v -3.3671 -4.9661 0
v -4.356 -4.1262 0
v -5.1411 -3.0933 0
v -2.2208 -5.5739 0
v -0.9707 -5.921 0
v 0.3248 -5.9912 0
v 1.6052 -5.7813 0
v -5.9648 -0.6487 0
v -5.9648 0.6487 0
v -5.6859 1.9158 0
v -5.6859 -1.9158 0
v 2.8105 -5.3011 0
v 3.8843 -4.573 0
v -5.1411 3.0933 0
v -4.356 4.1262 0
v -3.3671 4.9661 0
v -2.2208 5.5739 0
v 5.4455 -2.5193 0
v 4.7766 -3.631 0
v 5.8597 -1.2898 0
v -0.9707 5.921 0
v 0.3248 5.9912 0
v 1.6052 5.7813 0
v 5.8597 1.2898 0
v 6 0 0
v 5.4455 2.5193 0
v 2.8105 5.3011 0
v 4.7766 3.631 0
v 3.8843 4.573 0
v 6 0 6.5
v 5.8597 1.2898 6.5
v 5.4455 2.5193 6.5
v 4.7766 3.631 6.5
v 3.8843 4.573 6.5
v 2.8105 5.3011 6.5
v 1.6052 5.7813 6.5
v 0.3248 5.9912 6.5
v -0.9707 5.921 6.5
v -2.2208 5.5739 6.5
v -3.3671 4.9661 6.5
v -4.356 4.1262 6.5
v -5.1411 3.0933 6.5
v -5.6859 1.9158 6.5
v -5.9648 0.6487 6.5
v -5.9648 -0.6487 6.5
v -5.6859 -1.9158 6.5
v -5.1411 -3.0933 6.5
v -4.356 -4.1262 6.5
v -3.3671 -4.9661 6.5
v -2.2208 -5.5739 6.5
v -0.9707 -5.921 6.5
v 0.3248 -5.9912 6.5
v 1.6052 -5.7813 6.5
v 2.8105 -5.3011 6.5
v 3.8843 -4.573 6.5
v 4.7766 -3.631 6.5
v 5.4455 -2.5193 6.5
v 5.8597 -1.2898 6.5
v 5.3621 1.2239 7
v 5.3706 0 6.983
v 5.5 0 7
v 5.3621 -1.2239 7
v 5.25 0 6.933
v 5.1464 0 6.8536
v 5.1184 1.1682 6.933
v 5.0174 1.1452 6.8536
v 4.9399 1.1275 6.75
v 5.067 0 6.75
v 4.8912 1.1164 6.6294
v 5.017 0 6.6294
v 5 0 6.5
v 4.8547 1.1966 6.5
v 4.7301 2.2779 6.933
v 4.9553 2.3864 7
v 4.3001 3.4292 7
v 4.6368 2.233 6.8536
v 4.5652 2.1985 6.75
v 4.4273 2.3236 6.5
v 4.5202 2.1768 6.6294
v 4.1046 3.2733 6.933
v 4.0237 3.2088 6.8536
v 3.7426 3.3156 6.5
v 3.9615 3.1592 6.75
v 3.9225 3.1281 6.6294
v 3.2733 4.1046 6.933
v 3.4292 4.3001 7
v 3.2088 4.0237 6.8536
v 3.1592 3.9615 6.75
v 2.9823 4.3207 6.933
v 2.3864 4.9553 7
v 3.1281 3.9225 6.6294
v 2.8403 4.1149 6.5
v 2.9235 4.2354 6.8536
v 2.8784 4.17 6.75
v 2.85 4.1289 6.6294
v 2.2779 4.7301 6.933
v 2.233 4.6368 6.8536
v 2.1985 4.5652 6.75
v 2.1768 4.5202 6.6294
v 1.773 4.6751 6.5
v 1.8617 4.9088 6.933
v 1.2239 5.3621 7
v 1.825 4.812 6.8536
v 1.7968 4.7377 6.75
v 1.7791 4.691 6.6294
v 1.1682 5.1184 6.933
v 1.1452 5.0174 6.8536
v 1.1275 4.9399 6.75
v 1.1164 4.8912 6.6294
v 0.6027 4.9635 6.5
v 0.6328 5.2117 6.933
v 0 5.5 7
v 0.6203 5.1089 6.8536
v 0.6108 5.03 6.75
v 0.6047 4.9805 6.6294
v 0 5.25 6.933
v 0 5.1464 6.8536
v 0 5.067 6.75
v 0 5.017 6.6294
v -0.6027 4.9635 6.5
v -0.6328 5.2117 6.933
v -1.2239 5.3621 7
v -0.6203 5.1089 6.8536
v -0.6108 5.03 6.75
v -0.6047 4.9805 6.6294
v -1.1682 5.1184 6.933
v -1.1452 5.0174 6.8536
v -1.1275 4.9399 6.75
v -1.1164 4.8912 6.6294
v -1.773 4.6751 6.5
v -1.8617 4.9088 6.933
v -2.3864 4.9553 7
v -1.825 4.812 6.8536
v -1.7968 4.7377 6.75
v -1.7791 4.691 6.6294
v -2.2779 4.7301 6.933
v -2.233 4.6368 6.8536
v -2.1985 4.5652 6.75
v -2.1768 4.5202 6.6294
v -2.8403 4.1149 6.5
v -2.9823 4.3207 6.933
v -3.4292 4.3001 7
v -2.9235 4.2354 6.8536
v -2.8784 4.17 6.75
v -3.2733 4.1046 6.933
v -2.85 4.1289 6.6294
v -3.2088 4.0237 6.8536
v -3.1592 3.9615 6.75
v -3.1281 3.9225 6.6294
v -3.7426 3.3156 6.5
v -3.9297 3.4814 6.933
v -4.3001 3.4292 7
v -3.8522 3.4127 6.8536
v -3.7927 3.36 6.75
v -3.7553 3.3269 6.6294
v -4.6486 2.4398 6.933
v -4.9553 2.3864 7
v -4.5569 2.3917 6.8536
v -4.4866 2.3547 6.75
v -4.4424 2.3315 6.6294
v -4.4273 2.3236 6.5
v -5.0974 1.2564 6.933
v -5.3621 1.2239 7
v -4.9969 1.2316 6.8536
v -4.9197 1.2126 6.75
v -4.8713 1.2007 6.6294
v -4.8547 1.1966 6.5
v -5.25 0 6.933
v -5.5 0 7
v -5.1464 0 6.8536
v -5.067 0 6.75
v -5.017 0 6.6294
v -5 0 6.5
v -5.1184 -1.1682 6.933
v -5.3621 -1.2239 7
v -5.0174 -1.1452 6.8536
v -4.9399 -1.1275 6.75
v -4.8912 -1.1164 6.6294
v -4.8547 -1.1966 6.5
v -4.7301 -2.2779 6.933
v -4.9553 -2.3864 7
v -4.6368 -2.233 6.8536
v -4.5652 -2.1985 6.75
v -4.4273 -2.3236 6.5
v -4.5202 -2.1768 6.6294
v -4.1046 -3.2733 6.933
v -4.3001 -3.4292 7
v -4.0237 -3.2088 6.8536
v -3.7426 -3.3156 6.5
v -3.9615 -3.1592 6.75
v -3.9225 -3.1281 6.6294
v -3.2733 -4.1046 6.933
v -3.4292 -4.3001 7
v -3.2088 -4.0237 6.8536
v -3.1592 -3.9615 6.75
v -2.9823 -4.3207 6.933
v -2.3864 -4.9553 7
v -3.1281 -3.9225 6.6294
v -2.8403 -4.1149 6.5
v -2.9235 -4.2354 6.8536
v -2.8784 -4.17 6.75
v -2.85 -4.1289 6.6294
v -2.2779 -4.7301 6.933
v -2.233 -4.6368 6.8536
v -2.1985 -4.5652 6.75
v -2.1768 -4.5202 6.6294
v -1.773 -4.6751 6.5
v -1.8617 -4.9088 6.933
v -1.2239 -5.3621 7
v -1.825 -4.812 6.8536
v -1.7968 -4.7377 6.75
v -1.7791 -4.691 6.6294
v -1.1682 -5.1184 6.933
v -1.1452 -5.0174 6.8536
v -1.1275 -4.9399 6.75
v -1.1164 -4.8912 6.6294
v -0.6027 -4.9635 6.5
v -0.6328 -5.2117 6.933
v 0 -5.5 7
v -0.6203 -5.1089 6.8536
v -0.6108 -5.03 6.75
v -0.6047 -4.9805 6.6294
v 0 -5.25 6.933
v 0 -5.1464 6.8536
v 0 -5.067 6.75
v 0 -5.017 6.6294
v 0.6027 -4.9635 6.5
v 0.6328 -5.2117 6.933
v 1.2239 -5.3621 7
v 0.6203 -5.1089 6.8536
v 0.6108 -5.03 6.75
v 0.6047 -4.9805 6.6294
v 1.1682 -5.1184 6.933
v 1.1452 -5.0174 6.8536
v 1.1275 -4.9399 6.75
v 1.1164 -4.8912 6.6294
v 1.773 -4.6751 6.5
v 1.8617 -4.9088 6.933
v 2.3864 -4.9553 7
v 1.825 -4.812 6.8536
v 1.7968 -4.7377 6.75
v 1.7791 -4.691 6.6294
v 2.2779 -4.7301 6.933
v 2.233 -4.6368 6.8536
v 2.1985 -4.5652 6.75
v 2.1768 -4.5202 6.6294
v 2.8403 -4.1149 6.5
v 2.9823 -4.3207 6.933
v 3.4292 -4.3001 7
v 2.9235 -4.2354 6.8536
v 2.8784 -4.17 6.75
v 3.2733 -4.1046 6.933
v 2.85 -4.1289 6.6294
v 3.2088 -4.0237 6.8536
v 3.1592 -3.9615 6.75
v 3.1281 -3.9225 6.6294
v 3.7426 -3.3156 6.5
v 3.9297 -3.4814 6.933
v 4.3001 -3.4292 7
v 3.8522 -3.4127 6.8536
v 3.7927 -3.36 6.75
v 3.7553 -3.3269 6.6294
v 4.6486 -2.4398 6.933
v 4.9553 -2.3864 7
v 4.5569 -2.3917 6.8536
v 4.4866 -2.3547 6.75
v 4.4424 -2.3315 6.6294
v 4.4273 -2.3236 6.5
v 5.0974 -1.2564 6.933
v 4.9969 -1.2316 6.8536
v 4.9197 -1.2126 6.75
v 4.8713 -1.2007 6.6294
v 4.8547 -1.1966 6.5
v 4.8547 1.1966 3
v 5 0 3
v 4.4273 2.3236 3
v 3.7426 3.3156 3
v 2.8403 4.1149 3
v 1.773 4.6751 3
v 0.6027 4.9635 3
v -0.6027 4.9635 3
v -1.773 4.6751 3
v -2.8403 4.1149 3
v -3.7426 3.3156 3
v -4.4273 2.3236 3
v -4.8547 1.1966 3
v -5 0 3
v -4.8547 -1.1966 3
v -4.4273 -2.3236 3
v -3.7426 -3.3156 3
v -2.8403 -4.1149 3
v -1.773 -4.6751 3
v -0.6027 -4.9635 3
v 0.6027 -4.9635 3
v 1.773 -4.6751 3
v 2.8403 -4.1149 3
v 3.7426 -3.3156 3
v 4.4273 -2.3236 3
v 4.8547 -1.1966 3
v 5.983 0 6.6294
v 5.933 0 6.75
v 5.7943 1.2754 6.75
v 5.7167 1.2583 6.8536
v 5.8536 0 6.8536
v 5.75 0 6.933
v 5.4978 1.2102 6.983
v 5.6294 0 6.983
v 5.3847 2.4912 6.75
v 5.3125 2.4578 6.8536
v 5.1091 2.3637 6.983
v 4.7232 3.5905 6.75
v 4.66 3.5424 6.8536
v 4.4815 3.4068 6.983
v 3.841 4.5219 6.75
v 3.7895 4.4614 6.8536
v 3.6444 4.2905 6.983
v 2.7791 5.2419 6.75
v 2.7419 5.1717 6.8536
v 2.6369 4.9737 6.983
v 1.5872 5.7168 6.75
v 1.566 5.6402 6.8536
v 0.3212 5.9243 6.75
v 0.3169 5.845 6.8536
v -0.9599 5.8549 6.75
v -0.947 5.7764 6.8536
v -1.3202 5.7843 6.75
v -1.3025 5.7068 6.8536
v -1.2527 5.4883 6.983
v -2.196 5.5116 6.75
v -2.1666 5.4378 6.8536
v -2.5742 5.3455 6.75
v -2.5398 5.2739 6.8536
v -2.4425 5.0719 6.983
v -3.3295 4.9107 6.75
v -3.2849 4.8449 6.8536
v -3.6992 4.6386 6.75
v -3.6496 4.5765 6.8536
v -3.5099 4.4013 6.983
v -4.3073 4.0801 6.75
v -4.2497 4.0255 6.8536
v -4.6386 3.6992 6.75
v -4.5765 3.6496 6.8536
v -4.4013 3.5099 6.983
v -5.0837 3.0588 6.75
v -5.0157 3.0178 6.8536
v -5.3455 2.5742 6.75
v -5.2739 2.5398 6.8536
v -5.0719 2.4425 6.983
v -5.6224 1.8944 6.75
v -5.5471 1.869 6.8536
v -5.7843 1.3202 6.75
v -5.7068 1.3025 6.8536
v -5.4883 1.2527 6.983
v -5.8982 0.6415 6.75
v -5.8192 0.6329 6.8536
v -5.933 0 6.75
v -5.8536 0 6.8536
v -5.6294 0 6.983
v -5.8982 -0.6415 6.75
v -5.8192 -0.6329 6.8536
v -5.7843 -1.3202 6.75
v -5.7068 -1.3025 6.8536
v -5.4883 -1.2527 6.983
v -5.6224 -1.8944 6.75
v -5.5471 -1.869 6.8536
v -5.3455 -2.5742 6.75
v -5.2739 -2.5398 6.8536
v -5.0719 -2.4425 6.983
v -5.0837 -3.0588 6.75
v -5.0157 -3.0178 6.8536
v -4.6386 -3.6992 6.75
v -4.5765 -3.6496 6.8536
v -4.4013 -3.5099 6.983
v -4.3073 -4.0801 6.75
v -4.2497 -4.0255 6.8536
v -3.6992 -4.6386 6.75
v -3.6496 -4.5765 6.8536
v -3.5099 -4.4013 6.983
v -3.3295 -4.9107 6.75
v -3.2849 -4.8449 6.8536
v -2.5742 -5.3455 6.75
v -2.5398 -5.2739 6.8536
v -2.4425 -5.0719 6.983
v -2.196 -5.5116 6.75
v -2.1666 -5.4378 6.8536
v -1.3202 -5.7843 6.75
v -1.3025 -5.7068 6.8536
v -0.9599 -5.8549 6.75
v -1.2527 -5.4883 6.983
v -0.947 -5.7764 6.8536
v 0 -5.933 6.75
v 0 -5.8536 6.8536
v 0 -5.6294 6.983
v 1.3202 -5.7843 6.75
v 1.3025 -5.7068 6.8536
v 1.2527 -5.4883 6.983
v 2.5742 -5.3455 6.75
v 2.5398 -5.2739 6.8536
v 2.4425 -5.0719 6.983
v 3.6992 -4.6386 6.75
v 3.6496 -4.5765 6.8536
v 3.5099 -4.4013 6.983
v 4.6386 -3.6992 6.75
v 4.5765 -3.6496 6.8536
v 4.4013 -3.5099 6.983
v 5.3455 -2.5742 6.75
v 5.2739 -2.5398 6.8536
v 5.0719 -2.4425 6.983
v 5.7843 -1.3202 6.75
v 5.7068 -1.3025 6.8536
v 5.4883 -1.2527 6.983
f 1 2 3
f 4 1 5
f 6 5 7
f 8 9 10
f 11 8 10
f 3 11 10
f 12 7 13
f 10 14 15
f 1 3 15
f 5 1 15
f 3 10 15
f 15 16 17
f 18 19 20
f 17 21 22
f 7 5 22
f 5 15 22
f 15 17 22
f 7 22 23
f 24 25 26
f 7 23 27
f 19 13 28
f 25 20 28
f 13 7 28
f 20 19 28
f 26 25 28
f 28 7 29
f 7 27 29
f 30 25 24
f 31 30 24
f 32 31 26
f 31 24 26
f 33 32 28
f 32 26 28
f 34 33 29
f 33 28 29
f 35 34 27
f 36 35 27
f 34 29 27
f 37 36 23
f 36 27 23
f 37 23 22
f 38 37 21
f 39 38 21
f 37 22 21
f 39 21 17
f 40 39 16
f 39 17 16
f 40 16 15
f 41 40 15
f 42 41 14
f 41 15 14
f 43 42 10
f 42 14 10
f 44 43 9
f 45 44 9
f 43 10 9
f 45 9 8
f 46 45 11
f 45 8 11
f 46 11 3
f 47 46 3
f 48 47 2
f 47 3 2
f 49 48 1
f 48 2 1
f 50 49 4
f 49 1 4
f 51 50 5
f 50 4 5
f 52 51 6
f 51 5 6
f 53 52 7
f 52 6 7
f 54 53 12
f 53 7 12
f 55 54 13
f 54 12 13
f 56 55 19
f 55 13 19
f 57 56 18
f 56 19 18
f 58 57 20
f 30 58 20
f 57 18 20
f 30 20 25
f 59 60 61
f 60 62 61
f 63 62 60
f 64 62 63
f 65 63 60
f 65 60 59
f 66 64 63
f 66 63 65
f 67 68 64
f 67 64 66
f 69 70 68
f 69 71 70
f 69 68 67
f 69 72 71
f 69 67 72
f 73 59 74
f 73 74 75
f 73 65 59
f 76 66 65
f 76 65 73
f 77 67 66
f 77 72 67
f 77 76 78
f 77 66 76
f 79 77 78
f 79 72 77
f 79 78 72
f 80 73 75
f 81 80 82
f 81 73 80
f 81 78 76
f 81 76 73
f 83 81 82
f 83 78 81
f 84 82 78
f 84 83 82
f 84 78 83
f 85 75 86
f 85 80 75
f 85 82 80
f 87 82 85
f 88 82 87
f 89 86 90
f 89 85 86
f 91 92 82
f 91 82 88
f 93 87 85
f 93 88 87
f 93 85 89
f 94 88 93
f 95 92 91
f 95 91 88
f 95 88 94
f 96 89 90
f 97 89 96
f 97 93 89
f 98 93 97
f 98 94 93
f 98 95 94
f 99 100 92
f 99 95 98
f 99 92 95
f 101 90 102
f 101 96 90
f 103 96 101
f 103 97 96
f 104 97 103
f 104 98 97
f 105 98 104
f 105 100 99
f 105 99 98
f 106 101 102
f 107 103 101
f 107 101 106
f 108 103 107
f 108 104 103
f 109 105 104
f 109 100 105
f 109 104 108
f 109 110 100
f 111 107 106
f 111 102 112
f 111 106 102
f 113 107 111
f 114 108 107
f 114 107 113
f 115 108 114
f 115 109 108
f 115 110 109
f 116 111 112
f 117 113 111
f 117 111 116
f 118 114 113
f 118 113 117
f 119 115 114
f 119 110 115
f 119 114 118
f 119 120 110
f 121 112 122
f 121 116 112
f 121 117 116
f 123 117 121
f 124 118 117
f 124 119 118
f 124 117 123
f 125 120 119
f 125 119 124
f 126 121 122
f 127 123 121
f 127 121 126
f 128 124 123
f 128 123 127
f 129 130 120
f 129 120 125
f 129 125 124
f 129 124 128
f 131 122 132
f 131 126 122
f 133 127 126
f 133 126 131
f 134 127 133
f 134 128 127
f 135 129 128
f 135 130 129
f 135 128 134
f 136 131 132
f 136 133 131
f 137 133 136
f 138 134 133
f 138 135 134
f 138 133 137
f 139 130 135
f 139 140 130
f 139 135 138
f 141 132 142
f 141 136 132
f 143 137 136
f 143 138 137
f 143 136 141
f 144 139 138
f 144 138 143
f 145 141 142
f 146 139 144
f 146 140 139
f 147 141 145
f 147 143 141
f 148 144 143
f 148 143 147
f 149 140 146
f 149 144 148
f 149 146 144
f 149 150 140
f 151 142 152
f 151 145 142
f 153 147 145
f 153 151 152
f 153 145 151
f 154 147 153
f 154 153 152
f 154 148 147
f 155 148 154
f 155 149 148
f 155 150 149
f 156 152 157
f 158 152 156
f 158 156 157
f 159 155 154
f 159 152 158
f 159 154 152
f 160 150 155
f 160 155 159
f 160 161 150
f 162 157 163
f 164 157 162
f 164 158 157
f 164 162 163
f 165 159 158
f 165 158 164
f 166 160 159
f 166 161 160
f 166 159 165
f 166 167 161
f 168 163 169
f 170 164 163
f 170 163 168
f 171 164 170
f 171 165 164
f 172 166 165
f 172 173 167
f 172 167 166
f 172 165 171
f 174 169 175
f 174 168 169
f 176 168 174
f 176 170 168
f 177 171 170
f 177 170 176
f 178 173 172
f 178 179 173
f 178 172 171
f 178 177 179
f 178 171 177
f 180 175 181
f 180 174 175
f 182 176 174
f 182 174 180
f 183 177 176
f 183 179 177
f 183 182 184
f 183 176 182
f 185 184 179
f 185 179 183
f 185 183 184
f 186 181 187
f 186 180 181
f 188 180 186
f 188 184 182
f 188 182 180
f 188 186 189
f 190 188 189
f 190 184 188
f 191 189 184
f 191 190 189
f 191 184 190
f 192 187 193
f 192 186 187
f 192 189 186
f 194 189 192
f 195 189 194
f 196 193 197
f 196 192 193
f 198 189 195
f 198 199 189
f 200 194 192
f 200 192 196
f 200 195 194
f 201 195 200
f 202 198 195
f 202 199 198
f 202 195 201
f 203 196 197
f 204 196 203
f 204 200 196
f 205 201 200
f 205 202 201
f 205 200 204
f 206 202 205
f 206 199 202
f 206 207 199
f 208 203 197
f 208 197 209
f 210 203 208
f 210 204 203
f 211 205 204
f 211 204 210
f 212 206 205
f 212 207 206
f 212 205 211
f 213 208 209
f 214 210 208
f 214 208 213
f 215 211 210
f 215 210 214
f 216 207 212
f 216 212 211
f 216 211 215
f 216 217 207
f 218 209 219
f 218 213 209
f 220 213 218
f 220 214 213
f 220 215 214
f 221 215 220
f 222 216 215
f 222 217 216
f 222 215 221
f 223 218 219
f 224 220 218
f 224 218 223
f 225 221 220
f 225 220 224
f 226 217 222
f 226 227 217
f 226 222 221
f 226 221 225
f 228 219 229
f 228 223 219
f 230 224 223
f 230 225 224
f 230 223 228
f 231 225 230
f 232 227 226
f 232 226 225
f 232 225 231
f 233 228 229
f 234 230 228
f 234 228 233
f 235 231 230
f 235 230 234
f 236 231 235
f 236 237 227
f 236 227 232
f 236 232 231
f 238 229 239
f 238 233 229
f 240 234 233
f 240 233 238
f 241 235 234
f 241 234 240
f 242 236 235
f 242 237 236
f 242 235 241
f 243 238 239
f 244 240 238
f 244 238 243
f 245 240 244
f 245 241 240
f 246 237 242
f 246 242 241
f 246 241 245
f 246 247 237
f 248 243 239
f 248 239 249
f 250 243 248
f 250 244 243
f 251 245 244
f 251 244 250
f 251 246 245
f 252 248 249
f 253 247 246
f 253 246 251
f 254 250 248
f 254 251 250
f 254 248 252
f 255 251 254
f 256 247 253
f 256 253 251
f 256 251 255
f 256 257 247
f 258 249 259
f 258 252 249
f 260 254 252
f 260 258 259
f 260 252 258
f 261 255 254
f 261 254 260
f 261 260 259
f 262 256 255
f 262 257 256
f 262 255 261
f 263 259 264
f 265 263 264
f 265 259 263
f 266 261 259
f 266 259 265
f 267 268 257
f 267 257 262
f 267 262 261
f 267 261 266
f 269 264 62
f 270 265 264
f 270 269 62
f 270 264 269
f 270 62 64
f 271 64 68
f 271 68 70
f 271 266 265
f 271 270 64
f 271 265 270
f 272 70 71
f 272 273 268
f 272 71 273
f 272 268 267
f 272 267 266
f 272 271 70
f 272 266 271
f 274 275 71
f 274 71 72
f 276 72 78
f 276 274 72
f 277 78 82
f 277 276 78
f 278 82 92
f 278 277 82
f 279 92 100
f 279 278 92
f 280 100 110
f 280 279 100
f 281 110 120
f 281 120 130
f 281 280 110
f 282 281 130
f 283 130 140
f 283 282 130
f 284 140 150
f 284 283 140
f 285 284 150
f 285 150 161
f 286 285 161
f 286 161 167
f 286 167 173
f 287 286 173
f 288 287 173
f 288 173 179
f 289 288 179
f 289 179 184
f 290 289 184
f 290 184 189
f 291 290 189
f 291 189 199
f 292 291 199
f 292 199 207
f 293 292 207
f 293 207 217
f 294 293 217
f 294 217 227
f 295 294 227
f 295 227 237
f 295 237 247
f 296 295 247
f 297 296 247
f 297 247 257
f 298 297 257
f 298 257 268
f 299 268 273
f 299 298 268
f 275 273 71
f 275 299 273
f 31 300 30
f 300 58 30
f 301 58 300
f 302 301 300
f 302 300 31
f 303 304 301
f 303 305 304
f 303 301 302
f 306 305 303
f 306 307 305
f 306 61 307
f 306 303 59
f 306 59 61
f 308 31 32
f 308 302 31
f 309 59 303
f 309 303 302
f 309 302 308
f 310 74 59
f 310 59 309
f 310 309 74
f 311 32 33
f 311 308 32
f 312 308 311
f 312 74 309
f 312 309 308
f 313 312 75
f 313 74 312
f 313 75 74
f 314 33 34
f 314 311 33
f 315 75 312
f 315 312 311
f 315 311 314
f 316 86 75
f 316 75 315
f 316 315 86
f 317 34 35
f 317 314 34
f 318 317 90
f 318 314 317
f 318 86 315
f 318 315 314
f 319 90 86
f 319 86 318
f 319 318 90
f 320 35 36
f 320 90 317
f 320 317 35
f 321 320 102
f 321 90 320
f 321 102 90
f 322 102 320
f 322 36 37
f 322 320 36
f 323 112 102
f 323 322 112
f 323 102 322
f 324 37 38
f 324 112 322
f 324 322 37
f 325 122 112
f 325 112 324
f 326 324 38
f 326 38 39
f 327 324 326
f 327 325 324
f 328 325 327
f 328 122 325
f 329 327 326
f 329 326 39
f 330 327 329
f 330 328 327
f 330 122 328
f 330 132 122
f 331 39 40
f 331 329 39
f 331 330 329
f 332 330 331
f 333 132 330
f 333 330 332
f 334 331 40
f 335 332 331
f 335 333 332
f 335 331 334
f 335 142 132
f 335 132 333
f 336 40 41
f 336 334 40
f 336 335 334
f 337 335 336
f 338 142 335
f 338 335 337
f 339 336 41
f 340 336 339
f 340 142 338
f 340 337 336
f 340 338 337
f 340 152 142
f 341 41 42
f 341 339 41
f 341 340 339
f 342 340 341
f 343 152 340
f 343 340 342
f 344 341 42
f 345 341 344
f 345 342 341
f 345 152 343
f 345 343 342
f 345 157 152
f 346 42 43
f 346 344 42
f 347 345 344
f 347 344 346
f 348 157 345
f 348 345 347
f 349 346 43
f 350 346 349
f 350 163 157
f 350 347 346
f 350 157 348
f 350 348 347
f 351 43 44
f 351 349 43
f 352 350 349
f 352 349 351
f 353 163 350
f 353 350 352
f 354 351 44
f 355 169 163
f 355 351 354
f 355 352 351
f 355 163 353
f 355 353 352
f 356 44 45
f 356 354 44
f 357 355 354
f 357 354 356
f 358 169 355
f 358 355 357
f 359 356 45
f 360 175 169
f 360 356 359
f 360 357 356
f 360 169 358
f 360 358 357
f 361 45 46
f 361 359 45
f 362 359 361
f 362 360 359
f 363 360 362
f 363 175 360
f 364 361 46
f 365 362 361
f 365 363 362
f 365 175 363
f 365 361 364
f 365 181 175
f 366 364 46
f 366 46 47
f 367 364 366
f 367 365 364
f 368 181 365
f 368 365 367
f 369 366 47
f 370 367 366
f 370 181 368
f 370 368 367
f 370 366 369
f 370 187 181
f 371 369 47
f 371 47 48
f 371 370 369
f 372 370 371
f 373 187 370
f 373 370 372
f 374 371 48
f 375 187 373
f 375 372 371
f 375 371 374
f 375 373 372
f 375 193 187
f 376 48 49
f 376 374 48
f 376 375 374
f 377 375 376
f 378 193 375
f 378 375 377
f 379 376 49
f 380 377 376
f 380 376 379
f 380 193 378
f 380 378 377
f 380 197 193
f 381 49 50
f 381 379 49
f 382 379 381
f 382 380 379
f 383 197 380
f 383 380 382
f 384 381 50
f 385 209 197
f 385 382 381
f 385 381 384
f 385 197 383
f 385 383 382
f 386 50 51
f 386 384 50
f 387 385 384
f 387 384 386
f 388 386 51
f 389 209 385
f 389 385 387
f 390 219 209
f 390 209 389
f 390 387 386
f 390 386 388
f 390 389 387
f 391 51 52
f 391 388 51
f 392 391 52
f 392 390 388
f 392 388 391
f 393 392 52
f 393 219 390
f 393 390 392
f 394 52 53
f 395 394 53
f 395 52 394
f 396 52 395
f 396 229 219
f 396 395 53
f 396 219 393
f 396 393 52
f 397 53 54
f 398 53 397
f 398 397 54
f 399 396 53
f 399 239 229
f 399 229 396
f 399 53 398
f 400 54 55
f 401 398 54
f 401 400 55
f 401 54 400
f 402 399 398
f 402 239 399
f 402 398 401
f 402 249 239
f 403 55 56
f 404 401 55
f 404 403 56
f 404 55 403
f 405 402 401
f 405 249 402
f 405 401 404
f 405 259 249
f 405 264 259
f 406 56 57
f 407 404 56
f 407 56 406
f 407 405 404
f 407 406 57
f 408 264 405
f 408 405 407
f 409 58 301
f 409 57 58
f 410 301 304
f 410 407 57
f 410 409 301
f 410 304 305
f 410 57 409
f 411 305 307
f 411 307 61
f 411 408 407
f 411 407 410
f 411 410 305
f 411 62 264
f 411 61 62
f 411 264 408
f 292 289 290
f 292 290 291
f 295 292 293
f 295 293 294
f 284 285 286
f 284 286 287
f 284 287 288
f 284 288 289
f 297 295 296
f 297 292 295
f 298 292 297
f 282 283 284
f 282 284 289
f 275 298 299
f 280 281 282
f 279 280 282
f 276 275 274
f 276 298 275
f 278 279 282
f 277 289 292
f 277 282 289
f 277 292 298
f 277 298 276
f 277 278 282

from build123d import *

# Parameters (mm, degrees)
F0_R     = 6
F0_R_2   = 5
F1_DEPTH = 7
F2_DEPTH = 3
F3_R     = 0.49999


# Not quite as in the source:
# - a fillet or chamfer is up to 0.001 mm smaller than in the source, because OpenCascade refuses the exact size


with BuildPart() as f1:
    # F0 (on Top) → F1 (new body)
    with BuildSketch(Plane.XY):
        Circle(F0_R)
        Circle(F0_R_2, mode=Mode.SUBTRACT)
    extrude(amount=F1_DEPTH)

    # F0 (on Top) → F2 (join)
    with BuildSketch(Plane.XY):
        Circle(F0_R_2)
    extrude(amount=F2_DEPTH)

    # F3 (radius 0.5 in the source; OpenCascade refuses exactly that, so slightly less here)
    f3_edges = [f1.edges().sort_by_distance(p)[0] for p in [
        (-6, 0, 7),
        (-5, 0, 7),
    ]]
    fillet(f3_edges, radius=F3_R)


solid = f1.part
